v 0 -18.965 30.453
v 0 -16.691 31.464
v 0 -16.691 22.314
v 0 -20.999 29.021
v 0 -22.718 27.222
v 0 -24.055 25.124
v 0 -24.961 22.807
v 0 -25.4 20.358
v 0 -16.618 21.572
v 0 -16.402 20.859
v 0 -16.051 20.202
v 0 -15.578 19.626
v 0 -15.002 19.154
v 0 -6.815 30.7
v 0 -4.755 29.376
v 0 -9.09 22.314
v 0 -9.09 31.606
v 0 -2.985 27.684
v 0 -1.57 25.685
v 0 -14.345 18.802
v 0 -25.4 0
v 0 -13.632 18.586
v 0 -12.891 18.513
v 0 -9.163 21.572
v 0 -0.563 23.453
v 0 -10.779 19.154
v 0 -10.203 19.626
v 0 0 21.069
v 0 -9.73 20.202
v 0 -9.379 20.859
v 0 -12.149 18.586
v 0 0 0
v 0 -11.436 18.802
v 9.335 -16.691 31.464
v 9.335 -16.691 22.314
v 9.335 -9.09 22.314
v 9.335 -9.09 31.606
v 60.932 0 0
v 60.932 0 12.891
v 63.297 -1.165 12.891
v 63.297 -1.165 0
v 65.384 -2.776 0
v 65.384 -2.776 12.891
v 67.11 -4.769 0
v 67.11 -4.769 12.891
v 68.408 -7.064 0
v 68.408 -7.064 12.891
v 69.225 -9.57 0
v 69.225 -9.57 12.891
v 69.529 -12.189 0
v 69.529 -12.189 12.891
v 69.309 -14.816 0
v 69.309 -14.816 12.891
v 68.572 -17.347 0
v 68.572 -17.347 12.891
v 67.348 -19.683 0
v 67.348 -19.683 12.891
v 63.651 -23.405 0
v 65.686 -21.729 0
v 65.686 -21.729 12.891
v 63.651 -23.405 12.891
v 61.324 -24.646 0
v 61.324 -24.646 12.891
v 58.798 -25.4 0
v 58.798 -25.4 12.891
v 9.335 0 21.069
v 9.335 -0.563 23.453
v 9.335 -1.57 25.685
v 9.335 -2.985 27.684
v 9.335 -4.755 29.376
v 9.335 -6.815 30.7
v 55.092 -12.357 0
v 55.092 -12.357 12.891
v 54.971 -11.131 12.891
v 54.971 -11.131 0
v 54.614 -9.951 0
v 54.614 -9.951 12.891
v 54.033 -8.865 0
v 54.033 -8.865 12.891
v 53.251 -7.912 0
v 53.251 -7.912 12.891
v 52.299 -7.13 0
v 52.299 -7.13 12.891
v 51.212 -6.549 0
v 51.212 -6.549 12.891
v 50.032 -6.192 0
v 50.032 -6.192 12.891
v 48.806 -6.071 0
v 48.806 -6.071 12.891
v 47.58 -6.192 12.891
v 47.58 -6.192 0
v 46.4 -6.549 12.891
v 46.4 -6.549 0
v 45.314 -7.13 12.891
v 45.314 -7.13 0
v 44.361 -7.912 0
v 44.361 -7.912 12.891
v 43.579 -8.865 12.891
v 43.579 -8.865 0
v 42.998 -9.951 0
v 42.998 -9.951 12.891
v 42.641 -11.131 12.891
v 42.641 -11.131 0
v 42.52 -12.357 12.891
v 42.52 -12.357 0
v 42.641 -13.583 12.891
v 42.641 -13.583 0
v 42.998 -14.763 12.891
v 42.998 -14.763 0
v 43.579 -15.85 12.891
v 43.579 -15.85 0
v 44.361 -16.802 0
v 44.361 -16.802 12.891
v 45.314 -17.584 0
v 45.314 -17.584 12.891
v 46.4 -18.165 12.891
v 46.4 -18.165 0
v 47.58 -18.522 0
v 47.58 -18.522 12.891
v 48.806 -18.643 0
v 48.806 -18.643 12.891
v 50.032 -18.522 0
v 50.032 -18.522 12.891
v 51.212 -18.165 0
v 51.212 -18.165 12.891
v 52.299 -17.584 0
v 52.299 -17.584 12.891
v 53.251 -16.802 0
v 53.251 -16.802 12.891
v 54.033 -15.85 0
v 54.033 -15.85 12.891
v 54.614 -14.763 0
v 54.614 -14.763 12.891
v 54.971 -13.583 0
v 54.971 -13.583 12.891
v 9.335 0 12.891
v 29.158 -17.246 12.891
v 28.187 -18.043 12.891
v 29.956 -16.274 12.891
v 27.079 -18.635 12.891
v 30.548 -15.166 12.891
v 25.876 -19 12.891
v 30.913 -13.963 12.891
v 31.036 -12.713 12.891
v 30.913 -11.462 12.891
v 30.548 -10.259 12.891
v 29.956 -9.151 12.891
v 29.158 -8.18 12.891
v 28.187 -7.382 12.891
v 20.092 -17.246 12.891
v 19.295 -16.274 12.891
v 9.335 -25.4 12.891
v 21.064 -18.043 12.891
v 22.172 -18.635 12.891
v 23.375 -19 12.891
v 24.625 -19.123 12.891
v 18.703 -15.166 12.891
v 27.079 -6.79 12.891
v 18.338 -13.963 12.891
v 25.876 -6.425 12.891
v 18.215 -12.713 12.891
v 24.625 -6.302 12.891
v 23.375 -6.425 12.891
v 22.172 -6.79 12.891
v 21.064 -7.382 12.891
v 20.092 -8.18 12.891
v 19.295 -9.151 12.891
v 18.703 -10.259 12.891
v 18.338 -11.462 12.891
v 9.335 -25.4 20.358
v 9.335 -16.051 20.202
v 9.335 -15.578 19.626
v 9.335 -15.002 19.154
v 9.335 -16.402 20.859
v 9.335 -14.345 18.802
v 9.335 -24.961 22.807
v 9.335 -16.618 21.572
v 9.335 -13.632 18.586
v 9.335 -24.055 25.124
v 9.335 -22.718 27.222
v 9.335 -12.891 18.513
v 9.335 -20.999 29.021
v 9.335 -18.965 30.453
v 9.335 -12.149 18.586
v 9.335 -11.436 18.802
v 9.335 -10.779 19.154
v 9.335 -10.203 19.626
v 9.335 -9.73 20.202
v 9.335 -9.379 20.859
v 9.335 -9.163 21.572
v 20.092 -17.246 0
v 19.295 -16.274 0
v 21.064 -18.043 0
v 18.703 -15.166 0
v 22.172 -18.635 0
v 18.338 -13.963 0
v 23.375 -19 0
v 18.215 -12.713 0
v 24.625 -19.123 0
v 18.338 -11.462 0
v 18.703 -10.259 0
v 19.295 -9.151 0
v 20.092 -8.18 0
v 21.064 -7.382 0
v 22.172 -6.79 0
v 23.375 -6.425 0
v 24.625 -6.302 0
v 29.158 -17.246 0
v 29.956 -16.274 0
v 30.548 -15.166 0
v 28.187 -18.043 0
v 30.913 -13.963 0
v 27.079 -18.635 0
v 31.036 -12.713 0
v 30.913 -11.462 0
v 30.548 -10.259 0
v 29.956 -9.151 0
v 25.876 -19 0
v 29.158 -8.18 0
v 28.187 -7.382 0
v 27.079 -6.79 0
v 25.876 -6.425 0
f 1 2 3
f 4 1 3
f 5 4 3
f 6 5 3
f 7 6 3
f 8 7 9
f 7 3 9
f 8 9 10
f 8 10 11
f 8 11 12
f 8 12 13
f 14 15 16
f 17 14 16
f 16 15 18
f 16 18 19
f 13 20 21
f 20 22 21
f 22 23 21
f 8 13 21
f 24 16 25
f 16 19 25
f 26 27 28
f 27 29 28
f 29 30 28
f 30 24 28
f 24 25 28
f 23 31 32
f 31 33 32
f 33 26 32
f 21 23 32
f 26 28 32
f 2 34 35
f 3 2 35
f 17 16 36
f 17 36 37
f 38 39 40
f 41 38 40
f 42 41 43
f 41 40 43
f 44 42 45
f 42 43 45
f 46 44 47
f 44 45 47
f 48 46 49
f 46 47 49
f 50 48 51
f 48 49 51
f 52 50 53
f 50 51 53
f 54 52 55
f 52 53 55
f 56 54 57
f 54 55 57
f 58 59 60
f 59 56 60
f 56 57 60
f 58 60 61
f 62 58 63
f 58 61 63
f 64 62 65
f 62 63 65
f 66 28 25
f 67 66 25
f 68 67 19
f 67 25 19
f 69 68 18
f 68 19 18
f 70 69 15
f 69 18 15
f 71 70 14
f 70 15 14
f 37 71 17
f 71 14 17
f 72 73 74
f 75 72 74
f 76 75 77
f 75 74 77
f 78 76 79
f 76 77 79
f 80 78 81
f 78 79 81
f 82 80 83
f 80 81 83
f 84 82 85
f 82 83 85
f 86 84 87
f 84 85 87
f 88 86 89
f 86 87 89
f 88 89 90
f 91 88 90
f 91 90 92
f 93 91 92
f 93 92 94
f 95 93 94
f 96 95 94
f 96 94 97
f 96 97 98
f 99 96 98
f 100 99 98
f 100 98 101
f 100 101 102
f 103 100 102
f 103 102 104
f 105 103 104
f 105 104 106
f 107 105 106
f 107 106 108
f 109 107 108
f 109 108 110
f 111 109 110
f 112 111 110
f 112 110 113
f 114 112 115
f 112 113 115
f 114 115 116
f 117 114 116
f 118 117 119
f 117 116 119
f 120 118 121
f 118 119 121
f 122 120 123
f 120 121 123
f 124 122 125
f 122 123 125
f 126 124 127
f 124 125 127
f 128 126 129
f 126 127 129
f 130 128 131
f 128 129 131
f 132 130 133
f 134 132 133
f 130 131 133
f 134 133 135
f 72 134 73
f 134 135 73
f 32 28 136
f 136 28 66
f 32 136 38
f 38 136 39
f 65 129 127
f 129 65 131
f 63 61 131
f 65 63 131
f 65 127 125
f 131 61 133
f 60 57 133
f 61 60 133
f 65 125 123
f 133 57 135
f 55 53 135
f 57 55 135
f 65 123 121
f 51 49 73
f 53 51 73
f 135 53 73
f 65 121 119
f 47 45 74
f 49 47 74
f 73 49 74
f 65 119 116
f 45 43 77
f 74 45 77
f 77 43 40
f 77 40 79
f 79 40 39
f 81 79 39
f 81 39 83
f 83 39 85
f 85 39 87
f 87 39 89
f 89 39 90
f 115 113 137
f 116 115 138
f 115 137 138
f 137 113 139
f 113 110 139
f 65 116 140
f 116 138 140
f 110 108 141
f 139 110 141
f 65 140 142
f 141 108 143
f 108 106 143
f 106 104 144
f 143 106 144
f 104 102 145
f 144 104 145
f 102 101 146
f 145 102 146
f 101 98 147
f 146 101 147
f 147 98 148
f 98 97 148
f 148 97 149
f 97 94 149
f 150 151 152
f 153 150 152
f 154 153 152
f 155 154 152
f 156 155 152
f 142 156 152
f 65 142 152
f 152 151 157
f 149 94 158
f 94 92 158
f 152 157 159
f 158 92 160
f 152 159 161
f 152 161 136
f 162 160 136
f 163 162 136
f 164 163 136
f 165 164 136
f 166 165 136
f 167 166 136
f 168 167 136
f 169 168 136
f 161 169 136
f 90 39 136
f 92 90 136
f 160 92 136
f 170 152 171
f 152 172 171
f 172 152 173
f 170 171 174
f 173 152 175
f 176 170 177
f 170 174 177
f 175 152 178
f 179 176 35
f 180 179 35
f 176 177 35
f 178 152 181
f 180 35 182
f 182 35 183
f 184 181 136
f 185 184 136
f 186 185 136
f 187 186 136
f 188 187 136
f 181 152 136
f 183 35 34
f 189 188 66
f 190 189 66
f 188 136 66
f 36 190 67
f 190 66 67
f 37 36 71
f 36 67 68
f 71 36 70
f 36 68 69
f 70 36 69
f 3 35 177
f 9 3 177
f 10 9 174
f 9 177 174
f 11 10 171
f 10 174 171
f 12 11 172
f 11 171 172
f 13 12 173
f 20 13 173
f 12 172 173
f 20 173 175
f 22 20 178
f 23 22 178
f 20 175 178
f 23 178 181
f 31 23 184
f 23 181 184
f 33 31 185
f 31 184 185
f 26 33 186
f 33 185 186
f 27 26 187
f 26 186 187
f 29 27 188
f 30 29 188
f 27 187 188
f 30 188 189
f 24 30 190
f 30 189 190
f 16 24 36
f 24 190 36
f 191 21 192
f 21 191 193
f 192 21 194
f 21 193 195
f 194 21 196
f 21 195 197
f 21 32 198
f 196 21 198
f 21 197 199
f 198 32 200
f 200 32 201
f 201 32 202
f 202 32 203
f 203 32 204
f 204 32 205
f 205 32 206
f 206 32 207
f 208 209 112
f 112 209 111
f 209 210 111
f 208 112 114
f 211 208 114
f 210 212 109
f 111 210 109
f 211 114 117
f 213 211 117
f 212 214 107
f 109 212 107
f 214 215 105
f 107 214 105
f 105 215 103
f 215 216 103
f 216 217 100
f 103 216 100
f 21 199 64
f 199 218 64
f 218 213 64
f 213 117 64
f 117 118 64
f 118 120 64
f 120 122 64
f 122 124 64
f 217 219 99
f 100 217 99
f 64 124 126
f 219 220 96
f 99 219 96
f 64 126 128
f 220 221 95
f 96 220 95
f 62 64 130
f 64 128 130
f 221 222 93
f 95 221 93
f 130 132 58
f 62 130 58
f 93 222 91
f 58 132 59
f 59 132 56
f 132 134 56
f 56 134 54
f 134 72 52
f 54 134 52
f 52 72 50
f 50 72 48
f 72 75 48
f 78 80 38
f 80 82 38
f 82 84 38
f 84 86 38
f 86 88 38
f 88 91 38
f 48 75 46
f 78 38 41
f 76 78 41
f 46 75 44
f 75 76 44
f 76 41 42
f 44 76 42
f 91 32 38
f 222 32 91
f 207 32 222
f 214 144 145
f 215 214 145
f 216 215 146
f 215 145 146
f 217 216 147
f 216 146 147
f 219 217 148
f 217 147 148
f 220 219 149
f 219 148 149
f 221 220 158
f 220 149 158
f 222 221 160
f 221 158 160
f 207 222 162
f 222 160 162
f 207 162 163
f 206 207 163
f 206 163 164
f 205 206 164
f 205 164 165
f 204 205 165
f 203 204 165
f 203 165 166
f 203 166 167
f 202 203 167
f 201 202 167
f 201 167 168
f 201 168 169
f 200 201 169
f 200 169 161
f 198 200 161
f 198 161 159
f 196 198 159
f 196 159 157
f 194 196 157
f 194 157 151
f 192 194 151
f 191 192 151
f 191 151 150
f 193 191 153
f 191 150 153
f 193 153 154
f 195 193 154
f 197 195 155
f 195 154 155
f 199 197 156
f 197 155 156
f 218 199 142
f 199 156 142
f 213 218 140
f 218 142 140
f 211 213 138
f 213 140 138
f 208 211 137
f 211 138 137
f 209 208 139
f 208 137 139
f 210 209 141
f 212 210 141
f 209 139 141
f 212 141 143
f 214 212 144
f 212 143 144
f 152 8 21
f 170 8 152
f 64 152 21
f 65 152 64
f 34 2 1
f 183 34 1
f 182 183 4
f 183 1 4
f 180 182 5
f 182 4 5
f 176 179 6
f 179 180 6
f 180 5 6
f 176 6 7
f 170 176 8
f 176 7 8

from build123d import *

# Parameters (mm, degrees)
F1_DEPTH  = 25.4
F2_R      = 6.2861798015
F2_R_2    = 6.4106702401
F3_DEPTH  = 12.8915009478
F5_DEPTH  = 12.8915009478
F7_DEPTH  = 69.5320936104
F10_DEPTH = 9.335500879


with BuildPart() as f1:
    # F0 (on Front) → F1 (new body)
    with BuildSketch(Plane.XZ):
        Polygon((0, 31.9150984287), (0, 0), (69.6087032557, 0), (69.6087032557, 12.8905009478), (9.334500879, 12.8905009478), (9.334500879, 31.9150984287), align=None)
    extrude(amount=F1_DEPTH)

    # F2 (on face) → F3 (cut, through all)
    with BuildSketch(Plane.XY.offset(12.8905009478)):
        with Locations((48.8061010838, -12.3570999131)):
            Circle(F2_R)
        with Locations((24.6252994984, -12.7127002925)):
            Circle(F2_R_2)
    extrude(amount=-F3_DEPTH, mode=Mode.SUBTRACT)

    # F4 (on face) → F5 (cut, through all)
    with BuildSketch(Plane.XY.offset(12.8905009478)):
        with BuildLine():
            ThreePointArc((60.931898555, 0), (69.4846296944, -13.5080407898), (58.7982981412, -25.4))
            Line((58.7982981412, -25.4), (69.6087032557, -25.4))
            Line((69.6087032557, -25.4), (69.6087032557, 0))
            Line((69.6087032557, 0), (60.931898555, 0))
        make_face()
    extrude(amount=-F5_DEPTH, mode=Mode.SUBTRACT)

    # F6 (on face) → F7 (cut, through all)
    with BuildSketch(Plane(origin=(0, 0, 0), x_dir=(0, -1, 0), z_dir=(-1, 0, 0))):
        with BuildLine():
            ThreePointArc((0, 21.0692994297), (3.4400048541, 28.1838195258), (10.4061793669, 31.9150984287))
            Line((10.4061793669, 31.9150984287), (0, 31.9150984287))
            Line((0, 31.9150984287), (0, 21.0692994297))
        make_face()
        with BuildLine():
            ThreePointArc((14.9166792368, 31.9150984287), (22.126877753, 27.9222549677), (25.4, 20.3581005335))
            Line((25.4, 20.3581005335), (25.4, 31.9150984287))
            Line((25.4, 31.9150984287), (14.9166792368, 31.9150984287))
        make_face()
    extrude(amount=-F7_DEPTH, mode=Mode.SUBTRACT)

    # F9 (on face) → F10 (cut, through all)
    with BuildSketch(Plane.YZ.offset(9.334500879)):
        with BuildLine():
            ThreePointArc((-16.6914294769, 22.3139002919), (-12.8905000165, 26.1148297523), (-9.0895705561, 22.3139002919))
            Line((-9.0895705561, 22.3139002919), (-9.0895705561, 31.6063540242))
            ThreePointArc((-9.0895705561, 31.6063540242), (-9.7437881877, 31.7781538537), (-10.4061793669, 31.9150984287))
            Line((-10.4061793669, 31.9150984287), (-14.9166792368, 31.9150984287))
            ThreePointArc((-14.9166792368, 31.9150984287), (-15.8121520335, 31.7211826291), (-16.6914294769, 31.4636053697))
            Line((-16.6914294769, 31.4636053697), (-16.6914294769, 22.3139002919))
        make_face()
        with BuildLine():
            ThreePointArc((-16.6914294769, 22.3139002919), (-12.8905000165, 18.5129708315), (-9.0895705561, 22.3139002919))
            ThreePointArc((-9.0895705561, 22.3139002919), (-12.8905000165, 26.1148297523), (-16.6914294769, 22.3139002919))
        make_face()
    extrude(amount=-F10_DEPTH, mode=Mode.SUBTRACT)


solid = f1.part
